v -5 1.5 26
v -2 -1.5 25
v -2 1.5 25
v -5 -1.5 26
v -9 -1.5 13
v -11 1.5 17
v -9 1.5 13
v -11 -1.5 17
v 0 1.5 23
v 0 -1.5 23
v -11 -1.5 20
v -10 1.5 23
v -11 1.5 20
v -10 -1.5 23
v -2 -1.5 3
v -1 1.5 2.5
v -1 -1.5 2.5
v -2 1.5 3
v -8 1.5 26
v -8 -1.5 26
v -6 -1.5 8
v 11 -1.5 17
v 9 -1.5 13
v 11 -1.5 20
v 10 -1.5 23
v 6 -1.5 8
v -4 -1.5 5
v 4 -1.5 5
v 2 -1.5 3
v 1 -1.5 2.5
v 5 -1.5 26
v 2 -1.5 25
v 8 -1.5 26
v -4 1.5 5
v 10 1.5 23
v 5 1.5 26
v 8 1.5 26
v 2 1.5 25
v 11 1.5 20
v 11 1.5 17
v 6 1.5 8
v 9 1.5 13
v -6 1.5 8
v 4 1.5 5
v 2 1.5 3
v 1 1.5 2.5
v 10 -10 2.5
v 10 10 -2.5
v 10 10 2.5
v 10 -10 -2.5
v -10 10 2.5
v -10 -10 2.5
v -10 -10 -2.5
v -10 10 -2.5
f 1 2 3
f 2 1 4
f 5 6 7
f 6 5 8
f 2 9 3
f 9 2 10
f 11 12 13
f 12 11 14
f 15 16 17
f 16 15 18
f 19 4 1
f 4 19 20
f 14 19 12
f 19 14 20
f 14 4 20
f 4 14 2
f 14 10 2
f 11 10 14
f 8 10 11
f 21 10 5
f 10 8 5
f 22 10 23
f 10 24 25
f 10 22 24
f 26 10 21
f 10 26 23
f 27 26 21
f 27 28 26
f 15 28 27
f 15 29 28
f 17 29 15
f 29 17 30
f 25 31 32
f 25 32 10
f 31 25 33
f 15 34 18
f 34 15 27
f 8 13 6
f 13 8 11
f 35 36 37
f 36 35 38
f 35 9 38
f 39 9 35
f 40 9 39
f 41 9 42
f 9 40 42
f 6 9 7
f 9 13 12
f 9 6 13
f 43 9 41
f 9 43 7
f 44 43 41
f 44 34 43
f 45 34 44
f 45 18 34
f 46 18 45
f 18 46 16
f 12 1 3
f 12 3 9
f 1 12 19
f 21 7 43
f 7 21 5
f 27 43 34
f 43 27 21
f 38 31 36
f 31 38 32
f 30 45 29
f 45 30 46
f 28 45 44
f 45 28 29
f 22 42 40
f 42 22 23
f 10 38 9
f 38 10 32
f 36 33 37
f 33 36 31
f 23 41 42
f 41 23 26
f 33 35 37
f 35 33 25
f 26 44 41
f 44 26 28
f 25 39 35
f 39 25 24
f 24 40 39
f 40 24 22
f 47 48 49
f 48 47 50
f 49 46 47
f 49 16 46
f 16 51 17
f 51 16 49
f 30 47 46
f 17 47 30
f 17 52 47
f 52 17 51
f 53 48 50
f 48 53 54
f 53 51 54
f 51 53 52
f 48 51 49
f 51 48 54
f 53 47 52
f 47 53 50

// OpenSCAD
//start
module  bisecHeart() { 
	color  ([0.6,0.6,0.6]) { 
    polygon(
      points = [
        [15.00,3.00]
        ,[13.00,5.00]
        ,[10.00,6.00]
        ,[7.00,6.00]
        ,[5.00,3.00]
        ,[4.00,0.00]
        ,[4.00,-3.00]
        ,[6.00,-7.00]
        ,[9.00,-12.00]
        ,[11.00,-15.00]
        ,[13.00,-17.00]
        ,[15.00,-18.00]],
      paths = [[0,1,2,3,4,5,6,7,8,9,10,11]]
    );
  }
}

translate([0,1.5,20])
rotate(a=[90,0,0]) {
	translate([-15,0,0])
	color("red")
	linear_extrude(height = 3)
	bisecHeart();

	translate([15,0,3])
	color("red")
	rotate(a=[0,180,0])
	linear_extrude(height = 3)
	bisecHeart();
}
cube([20,20,5], center=true);
